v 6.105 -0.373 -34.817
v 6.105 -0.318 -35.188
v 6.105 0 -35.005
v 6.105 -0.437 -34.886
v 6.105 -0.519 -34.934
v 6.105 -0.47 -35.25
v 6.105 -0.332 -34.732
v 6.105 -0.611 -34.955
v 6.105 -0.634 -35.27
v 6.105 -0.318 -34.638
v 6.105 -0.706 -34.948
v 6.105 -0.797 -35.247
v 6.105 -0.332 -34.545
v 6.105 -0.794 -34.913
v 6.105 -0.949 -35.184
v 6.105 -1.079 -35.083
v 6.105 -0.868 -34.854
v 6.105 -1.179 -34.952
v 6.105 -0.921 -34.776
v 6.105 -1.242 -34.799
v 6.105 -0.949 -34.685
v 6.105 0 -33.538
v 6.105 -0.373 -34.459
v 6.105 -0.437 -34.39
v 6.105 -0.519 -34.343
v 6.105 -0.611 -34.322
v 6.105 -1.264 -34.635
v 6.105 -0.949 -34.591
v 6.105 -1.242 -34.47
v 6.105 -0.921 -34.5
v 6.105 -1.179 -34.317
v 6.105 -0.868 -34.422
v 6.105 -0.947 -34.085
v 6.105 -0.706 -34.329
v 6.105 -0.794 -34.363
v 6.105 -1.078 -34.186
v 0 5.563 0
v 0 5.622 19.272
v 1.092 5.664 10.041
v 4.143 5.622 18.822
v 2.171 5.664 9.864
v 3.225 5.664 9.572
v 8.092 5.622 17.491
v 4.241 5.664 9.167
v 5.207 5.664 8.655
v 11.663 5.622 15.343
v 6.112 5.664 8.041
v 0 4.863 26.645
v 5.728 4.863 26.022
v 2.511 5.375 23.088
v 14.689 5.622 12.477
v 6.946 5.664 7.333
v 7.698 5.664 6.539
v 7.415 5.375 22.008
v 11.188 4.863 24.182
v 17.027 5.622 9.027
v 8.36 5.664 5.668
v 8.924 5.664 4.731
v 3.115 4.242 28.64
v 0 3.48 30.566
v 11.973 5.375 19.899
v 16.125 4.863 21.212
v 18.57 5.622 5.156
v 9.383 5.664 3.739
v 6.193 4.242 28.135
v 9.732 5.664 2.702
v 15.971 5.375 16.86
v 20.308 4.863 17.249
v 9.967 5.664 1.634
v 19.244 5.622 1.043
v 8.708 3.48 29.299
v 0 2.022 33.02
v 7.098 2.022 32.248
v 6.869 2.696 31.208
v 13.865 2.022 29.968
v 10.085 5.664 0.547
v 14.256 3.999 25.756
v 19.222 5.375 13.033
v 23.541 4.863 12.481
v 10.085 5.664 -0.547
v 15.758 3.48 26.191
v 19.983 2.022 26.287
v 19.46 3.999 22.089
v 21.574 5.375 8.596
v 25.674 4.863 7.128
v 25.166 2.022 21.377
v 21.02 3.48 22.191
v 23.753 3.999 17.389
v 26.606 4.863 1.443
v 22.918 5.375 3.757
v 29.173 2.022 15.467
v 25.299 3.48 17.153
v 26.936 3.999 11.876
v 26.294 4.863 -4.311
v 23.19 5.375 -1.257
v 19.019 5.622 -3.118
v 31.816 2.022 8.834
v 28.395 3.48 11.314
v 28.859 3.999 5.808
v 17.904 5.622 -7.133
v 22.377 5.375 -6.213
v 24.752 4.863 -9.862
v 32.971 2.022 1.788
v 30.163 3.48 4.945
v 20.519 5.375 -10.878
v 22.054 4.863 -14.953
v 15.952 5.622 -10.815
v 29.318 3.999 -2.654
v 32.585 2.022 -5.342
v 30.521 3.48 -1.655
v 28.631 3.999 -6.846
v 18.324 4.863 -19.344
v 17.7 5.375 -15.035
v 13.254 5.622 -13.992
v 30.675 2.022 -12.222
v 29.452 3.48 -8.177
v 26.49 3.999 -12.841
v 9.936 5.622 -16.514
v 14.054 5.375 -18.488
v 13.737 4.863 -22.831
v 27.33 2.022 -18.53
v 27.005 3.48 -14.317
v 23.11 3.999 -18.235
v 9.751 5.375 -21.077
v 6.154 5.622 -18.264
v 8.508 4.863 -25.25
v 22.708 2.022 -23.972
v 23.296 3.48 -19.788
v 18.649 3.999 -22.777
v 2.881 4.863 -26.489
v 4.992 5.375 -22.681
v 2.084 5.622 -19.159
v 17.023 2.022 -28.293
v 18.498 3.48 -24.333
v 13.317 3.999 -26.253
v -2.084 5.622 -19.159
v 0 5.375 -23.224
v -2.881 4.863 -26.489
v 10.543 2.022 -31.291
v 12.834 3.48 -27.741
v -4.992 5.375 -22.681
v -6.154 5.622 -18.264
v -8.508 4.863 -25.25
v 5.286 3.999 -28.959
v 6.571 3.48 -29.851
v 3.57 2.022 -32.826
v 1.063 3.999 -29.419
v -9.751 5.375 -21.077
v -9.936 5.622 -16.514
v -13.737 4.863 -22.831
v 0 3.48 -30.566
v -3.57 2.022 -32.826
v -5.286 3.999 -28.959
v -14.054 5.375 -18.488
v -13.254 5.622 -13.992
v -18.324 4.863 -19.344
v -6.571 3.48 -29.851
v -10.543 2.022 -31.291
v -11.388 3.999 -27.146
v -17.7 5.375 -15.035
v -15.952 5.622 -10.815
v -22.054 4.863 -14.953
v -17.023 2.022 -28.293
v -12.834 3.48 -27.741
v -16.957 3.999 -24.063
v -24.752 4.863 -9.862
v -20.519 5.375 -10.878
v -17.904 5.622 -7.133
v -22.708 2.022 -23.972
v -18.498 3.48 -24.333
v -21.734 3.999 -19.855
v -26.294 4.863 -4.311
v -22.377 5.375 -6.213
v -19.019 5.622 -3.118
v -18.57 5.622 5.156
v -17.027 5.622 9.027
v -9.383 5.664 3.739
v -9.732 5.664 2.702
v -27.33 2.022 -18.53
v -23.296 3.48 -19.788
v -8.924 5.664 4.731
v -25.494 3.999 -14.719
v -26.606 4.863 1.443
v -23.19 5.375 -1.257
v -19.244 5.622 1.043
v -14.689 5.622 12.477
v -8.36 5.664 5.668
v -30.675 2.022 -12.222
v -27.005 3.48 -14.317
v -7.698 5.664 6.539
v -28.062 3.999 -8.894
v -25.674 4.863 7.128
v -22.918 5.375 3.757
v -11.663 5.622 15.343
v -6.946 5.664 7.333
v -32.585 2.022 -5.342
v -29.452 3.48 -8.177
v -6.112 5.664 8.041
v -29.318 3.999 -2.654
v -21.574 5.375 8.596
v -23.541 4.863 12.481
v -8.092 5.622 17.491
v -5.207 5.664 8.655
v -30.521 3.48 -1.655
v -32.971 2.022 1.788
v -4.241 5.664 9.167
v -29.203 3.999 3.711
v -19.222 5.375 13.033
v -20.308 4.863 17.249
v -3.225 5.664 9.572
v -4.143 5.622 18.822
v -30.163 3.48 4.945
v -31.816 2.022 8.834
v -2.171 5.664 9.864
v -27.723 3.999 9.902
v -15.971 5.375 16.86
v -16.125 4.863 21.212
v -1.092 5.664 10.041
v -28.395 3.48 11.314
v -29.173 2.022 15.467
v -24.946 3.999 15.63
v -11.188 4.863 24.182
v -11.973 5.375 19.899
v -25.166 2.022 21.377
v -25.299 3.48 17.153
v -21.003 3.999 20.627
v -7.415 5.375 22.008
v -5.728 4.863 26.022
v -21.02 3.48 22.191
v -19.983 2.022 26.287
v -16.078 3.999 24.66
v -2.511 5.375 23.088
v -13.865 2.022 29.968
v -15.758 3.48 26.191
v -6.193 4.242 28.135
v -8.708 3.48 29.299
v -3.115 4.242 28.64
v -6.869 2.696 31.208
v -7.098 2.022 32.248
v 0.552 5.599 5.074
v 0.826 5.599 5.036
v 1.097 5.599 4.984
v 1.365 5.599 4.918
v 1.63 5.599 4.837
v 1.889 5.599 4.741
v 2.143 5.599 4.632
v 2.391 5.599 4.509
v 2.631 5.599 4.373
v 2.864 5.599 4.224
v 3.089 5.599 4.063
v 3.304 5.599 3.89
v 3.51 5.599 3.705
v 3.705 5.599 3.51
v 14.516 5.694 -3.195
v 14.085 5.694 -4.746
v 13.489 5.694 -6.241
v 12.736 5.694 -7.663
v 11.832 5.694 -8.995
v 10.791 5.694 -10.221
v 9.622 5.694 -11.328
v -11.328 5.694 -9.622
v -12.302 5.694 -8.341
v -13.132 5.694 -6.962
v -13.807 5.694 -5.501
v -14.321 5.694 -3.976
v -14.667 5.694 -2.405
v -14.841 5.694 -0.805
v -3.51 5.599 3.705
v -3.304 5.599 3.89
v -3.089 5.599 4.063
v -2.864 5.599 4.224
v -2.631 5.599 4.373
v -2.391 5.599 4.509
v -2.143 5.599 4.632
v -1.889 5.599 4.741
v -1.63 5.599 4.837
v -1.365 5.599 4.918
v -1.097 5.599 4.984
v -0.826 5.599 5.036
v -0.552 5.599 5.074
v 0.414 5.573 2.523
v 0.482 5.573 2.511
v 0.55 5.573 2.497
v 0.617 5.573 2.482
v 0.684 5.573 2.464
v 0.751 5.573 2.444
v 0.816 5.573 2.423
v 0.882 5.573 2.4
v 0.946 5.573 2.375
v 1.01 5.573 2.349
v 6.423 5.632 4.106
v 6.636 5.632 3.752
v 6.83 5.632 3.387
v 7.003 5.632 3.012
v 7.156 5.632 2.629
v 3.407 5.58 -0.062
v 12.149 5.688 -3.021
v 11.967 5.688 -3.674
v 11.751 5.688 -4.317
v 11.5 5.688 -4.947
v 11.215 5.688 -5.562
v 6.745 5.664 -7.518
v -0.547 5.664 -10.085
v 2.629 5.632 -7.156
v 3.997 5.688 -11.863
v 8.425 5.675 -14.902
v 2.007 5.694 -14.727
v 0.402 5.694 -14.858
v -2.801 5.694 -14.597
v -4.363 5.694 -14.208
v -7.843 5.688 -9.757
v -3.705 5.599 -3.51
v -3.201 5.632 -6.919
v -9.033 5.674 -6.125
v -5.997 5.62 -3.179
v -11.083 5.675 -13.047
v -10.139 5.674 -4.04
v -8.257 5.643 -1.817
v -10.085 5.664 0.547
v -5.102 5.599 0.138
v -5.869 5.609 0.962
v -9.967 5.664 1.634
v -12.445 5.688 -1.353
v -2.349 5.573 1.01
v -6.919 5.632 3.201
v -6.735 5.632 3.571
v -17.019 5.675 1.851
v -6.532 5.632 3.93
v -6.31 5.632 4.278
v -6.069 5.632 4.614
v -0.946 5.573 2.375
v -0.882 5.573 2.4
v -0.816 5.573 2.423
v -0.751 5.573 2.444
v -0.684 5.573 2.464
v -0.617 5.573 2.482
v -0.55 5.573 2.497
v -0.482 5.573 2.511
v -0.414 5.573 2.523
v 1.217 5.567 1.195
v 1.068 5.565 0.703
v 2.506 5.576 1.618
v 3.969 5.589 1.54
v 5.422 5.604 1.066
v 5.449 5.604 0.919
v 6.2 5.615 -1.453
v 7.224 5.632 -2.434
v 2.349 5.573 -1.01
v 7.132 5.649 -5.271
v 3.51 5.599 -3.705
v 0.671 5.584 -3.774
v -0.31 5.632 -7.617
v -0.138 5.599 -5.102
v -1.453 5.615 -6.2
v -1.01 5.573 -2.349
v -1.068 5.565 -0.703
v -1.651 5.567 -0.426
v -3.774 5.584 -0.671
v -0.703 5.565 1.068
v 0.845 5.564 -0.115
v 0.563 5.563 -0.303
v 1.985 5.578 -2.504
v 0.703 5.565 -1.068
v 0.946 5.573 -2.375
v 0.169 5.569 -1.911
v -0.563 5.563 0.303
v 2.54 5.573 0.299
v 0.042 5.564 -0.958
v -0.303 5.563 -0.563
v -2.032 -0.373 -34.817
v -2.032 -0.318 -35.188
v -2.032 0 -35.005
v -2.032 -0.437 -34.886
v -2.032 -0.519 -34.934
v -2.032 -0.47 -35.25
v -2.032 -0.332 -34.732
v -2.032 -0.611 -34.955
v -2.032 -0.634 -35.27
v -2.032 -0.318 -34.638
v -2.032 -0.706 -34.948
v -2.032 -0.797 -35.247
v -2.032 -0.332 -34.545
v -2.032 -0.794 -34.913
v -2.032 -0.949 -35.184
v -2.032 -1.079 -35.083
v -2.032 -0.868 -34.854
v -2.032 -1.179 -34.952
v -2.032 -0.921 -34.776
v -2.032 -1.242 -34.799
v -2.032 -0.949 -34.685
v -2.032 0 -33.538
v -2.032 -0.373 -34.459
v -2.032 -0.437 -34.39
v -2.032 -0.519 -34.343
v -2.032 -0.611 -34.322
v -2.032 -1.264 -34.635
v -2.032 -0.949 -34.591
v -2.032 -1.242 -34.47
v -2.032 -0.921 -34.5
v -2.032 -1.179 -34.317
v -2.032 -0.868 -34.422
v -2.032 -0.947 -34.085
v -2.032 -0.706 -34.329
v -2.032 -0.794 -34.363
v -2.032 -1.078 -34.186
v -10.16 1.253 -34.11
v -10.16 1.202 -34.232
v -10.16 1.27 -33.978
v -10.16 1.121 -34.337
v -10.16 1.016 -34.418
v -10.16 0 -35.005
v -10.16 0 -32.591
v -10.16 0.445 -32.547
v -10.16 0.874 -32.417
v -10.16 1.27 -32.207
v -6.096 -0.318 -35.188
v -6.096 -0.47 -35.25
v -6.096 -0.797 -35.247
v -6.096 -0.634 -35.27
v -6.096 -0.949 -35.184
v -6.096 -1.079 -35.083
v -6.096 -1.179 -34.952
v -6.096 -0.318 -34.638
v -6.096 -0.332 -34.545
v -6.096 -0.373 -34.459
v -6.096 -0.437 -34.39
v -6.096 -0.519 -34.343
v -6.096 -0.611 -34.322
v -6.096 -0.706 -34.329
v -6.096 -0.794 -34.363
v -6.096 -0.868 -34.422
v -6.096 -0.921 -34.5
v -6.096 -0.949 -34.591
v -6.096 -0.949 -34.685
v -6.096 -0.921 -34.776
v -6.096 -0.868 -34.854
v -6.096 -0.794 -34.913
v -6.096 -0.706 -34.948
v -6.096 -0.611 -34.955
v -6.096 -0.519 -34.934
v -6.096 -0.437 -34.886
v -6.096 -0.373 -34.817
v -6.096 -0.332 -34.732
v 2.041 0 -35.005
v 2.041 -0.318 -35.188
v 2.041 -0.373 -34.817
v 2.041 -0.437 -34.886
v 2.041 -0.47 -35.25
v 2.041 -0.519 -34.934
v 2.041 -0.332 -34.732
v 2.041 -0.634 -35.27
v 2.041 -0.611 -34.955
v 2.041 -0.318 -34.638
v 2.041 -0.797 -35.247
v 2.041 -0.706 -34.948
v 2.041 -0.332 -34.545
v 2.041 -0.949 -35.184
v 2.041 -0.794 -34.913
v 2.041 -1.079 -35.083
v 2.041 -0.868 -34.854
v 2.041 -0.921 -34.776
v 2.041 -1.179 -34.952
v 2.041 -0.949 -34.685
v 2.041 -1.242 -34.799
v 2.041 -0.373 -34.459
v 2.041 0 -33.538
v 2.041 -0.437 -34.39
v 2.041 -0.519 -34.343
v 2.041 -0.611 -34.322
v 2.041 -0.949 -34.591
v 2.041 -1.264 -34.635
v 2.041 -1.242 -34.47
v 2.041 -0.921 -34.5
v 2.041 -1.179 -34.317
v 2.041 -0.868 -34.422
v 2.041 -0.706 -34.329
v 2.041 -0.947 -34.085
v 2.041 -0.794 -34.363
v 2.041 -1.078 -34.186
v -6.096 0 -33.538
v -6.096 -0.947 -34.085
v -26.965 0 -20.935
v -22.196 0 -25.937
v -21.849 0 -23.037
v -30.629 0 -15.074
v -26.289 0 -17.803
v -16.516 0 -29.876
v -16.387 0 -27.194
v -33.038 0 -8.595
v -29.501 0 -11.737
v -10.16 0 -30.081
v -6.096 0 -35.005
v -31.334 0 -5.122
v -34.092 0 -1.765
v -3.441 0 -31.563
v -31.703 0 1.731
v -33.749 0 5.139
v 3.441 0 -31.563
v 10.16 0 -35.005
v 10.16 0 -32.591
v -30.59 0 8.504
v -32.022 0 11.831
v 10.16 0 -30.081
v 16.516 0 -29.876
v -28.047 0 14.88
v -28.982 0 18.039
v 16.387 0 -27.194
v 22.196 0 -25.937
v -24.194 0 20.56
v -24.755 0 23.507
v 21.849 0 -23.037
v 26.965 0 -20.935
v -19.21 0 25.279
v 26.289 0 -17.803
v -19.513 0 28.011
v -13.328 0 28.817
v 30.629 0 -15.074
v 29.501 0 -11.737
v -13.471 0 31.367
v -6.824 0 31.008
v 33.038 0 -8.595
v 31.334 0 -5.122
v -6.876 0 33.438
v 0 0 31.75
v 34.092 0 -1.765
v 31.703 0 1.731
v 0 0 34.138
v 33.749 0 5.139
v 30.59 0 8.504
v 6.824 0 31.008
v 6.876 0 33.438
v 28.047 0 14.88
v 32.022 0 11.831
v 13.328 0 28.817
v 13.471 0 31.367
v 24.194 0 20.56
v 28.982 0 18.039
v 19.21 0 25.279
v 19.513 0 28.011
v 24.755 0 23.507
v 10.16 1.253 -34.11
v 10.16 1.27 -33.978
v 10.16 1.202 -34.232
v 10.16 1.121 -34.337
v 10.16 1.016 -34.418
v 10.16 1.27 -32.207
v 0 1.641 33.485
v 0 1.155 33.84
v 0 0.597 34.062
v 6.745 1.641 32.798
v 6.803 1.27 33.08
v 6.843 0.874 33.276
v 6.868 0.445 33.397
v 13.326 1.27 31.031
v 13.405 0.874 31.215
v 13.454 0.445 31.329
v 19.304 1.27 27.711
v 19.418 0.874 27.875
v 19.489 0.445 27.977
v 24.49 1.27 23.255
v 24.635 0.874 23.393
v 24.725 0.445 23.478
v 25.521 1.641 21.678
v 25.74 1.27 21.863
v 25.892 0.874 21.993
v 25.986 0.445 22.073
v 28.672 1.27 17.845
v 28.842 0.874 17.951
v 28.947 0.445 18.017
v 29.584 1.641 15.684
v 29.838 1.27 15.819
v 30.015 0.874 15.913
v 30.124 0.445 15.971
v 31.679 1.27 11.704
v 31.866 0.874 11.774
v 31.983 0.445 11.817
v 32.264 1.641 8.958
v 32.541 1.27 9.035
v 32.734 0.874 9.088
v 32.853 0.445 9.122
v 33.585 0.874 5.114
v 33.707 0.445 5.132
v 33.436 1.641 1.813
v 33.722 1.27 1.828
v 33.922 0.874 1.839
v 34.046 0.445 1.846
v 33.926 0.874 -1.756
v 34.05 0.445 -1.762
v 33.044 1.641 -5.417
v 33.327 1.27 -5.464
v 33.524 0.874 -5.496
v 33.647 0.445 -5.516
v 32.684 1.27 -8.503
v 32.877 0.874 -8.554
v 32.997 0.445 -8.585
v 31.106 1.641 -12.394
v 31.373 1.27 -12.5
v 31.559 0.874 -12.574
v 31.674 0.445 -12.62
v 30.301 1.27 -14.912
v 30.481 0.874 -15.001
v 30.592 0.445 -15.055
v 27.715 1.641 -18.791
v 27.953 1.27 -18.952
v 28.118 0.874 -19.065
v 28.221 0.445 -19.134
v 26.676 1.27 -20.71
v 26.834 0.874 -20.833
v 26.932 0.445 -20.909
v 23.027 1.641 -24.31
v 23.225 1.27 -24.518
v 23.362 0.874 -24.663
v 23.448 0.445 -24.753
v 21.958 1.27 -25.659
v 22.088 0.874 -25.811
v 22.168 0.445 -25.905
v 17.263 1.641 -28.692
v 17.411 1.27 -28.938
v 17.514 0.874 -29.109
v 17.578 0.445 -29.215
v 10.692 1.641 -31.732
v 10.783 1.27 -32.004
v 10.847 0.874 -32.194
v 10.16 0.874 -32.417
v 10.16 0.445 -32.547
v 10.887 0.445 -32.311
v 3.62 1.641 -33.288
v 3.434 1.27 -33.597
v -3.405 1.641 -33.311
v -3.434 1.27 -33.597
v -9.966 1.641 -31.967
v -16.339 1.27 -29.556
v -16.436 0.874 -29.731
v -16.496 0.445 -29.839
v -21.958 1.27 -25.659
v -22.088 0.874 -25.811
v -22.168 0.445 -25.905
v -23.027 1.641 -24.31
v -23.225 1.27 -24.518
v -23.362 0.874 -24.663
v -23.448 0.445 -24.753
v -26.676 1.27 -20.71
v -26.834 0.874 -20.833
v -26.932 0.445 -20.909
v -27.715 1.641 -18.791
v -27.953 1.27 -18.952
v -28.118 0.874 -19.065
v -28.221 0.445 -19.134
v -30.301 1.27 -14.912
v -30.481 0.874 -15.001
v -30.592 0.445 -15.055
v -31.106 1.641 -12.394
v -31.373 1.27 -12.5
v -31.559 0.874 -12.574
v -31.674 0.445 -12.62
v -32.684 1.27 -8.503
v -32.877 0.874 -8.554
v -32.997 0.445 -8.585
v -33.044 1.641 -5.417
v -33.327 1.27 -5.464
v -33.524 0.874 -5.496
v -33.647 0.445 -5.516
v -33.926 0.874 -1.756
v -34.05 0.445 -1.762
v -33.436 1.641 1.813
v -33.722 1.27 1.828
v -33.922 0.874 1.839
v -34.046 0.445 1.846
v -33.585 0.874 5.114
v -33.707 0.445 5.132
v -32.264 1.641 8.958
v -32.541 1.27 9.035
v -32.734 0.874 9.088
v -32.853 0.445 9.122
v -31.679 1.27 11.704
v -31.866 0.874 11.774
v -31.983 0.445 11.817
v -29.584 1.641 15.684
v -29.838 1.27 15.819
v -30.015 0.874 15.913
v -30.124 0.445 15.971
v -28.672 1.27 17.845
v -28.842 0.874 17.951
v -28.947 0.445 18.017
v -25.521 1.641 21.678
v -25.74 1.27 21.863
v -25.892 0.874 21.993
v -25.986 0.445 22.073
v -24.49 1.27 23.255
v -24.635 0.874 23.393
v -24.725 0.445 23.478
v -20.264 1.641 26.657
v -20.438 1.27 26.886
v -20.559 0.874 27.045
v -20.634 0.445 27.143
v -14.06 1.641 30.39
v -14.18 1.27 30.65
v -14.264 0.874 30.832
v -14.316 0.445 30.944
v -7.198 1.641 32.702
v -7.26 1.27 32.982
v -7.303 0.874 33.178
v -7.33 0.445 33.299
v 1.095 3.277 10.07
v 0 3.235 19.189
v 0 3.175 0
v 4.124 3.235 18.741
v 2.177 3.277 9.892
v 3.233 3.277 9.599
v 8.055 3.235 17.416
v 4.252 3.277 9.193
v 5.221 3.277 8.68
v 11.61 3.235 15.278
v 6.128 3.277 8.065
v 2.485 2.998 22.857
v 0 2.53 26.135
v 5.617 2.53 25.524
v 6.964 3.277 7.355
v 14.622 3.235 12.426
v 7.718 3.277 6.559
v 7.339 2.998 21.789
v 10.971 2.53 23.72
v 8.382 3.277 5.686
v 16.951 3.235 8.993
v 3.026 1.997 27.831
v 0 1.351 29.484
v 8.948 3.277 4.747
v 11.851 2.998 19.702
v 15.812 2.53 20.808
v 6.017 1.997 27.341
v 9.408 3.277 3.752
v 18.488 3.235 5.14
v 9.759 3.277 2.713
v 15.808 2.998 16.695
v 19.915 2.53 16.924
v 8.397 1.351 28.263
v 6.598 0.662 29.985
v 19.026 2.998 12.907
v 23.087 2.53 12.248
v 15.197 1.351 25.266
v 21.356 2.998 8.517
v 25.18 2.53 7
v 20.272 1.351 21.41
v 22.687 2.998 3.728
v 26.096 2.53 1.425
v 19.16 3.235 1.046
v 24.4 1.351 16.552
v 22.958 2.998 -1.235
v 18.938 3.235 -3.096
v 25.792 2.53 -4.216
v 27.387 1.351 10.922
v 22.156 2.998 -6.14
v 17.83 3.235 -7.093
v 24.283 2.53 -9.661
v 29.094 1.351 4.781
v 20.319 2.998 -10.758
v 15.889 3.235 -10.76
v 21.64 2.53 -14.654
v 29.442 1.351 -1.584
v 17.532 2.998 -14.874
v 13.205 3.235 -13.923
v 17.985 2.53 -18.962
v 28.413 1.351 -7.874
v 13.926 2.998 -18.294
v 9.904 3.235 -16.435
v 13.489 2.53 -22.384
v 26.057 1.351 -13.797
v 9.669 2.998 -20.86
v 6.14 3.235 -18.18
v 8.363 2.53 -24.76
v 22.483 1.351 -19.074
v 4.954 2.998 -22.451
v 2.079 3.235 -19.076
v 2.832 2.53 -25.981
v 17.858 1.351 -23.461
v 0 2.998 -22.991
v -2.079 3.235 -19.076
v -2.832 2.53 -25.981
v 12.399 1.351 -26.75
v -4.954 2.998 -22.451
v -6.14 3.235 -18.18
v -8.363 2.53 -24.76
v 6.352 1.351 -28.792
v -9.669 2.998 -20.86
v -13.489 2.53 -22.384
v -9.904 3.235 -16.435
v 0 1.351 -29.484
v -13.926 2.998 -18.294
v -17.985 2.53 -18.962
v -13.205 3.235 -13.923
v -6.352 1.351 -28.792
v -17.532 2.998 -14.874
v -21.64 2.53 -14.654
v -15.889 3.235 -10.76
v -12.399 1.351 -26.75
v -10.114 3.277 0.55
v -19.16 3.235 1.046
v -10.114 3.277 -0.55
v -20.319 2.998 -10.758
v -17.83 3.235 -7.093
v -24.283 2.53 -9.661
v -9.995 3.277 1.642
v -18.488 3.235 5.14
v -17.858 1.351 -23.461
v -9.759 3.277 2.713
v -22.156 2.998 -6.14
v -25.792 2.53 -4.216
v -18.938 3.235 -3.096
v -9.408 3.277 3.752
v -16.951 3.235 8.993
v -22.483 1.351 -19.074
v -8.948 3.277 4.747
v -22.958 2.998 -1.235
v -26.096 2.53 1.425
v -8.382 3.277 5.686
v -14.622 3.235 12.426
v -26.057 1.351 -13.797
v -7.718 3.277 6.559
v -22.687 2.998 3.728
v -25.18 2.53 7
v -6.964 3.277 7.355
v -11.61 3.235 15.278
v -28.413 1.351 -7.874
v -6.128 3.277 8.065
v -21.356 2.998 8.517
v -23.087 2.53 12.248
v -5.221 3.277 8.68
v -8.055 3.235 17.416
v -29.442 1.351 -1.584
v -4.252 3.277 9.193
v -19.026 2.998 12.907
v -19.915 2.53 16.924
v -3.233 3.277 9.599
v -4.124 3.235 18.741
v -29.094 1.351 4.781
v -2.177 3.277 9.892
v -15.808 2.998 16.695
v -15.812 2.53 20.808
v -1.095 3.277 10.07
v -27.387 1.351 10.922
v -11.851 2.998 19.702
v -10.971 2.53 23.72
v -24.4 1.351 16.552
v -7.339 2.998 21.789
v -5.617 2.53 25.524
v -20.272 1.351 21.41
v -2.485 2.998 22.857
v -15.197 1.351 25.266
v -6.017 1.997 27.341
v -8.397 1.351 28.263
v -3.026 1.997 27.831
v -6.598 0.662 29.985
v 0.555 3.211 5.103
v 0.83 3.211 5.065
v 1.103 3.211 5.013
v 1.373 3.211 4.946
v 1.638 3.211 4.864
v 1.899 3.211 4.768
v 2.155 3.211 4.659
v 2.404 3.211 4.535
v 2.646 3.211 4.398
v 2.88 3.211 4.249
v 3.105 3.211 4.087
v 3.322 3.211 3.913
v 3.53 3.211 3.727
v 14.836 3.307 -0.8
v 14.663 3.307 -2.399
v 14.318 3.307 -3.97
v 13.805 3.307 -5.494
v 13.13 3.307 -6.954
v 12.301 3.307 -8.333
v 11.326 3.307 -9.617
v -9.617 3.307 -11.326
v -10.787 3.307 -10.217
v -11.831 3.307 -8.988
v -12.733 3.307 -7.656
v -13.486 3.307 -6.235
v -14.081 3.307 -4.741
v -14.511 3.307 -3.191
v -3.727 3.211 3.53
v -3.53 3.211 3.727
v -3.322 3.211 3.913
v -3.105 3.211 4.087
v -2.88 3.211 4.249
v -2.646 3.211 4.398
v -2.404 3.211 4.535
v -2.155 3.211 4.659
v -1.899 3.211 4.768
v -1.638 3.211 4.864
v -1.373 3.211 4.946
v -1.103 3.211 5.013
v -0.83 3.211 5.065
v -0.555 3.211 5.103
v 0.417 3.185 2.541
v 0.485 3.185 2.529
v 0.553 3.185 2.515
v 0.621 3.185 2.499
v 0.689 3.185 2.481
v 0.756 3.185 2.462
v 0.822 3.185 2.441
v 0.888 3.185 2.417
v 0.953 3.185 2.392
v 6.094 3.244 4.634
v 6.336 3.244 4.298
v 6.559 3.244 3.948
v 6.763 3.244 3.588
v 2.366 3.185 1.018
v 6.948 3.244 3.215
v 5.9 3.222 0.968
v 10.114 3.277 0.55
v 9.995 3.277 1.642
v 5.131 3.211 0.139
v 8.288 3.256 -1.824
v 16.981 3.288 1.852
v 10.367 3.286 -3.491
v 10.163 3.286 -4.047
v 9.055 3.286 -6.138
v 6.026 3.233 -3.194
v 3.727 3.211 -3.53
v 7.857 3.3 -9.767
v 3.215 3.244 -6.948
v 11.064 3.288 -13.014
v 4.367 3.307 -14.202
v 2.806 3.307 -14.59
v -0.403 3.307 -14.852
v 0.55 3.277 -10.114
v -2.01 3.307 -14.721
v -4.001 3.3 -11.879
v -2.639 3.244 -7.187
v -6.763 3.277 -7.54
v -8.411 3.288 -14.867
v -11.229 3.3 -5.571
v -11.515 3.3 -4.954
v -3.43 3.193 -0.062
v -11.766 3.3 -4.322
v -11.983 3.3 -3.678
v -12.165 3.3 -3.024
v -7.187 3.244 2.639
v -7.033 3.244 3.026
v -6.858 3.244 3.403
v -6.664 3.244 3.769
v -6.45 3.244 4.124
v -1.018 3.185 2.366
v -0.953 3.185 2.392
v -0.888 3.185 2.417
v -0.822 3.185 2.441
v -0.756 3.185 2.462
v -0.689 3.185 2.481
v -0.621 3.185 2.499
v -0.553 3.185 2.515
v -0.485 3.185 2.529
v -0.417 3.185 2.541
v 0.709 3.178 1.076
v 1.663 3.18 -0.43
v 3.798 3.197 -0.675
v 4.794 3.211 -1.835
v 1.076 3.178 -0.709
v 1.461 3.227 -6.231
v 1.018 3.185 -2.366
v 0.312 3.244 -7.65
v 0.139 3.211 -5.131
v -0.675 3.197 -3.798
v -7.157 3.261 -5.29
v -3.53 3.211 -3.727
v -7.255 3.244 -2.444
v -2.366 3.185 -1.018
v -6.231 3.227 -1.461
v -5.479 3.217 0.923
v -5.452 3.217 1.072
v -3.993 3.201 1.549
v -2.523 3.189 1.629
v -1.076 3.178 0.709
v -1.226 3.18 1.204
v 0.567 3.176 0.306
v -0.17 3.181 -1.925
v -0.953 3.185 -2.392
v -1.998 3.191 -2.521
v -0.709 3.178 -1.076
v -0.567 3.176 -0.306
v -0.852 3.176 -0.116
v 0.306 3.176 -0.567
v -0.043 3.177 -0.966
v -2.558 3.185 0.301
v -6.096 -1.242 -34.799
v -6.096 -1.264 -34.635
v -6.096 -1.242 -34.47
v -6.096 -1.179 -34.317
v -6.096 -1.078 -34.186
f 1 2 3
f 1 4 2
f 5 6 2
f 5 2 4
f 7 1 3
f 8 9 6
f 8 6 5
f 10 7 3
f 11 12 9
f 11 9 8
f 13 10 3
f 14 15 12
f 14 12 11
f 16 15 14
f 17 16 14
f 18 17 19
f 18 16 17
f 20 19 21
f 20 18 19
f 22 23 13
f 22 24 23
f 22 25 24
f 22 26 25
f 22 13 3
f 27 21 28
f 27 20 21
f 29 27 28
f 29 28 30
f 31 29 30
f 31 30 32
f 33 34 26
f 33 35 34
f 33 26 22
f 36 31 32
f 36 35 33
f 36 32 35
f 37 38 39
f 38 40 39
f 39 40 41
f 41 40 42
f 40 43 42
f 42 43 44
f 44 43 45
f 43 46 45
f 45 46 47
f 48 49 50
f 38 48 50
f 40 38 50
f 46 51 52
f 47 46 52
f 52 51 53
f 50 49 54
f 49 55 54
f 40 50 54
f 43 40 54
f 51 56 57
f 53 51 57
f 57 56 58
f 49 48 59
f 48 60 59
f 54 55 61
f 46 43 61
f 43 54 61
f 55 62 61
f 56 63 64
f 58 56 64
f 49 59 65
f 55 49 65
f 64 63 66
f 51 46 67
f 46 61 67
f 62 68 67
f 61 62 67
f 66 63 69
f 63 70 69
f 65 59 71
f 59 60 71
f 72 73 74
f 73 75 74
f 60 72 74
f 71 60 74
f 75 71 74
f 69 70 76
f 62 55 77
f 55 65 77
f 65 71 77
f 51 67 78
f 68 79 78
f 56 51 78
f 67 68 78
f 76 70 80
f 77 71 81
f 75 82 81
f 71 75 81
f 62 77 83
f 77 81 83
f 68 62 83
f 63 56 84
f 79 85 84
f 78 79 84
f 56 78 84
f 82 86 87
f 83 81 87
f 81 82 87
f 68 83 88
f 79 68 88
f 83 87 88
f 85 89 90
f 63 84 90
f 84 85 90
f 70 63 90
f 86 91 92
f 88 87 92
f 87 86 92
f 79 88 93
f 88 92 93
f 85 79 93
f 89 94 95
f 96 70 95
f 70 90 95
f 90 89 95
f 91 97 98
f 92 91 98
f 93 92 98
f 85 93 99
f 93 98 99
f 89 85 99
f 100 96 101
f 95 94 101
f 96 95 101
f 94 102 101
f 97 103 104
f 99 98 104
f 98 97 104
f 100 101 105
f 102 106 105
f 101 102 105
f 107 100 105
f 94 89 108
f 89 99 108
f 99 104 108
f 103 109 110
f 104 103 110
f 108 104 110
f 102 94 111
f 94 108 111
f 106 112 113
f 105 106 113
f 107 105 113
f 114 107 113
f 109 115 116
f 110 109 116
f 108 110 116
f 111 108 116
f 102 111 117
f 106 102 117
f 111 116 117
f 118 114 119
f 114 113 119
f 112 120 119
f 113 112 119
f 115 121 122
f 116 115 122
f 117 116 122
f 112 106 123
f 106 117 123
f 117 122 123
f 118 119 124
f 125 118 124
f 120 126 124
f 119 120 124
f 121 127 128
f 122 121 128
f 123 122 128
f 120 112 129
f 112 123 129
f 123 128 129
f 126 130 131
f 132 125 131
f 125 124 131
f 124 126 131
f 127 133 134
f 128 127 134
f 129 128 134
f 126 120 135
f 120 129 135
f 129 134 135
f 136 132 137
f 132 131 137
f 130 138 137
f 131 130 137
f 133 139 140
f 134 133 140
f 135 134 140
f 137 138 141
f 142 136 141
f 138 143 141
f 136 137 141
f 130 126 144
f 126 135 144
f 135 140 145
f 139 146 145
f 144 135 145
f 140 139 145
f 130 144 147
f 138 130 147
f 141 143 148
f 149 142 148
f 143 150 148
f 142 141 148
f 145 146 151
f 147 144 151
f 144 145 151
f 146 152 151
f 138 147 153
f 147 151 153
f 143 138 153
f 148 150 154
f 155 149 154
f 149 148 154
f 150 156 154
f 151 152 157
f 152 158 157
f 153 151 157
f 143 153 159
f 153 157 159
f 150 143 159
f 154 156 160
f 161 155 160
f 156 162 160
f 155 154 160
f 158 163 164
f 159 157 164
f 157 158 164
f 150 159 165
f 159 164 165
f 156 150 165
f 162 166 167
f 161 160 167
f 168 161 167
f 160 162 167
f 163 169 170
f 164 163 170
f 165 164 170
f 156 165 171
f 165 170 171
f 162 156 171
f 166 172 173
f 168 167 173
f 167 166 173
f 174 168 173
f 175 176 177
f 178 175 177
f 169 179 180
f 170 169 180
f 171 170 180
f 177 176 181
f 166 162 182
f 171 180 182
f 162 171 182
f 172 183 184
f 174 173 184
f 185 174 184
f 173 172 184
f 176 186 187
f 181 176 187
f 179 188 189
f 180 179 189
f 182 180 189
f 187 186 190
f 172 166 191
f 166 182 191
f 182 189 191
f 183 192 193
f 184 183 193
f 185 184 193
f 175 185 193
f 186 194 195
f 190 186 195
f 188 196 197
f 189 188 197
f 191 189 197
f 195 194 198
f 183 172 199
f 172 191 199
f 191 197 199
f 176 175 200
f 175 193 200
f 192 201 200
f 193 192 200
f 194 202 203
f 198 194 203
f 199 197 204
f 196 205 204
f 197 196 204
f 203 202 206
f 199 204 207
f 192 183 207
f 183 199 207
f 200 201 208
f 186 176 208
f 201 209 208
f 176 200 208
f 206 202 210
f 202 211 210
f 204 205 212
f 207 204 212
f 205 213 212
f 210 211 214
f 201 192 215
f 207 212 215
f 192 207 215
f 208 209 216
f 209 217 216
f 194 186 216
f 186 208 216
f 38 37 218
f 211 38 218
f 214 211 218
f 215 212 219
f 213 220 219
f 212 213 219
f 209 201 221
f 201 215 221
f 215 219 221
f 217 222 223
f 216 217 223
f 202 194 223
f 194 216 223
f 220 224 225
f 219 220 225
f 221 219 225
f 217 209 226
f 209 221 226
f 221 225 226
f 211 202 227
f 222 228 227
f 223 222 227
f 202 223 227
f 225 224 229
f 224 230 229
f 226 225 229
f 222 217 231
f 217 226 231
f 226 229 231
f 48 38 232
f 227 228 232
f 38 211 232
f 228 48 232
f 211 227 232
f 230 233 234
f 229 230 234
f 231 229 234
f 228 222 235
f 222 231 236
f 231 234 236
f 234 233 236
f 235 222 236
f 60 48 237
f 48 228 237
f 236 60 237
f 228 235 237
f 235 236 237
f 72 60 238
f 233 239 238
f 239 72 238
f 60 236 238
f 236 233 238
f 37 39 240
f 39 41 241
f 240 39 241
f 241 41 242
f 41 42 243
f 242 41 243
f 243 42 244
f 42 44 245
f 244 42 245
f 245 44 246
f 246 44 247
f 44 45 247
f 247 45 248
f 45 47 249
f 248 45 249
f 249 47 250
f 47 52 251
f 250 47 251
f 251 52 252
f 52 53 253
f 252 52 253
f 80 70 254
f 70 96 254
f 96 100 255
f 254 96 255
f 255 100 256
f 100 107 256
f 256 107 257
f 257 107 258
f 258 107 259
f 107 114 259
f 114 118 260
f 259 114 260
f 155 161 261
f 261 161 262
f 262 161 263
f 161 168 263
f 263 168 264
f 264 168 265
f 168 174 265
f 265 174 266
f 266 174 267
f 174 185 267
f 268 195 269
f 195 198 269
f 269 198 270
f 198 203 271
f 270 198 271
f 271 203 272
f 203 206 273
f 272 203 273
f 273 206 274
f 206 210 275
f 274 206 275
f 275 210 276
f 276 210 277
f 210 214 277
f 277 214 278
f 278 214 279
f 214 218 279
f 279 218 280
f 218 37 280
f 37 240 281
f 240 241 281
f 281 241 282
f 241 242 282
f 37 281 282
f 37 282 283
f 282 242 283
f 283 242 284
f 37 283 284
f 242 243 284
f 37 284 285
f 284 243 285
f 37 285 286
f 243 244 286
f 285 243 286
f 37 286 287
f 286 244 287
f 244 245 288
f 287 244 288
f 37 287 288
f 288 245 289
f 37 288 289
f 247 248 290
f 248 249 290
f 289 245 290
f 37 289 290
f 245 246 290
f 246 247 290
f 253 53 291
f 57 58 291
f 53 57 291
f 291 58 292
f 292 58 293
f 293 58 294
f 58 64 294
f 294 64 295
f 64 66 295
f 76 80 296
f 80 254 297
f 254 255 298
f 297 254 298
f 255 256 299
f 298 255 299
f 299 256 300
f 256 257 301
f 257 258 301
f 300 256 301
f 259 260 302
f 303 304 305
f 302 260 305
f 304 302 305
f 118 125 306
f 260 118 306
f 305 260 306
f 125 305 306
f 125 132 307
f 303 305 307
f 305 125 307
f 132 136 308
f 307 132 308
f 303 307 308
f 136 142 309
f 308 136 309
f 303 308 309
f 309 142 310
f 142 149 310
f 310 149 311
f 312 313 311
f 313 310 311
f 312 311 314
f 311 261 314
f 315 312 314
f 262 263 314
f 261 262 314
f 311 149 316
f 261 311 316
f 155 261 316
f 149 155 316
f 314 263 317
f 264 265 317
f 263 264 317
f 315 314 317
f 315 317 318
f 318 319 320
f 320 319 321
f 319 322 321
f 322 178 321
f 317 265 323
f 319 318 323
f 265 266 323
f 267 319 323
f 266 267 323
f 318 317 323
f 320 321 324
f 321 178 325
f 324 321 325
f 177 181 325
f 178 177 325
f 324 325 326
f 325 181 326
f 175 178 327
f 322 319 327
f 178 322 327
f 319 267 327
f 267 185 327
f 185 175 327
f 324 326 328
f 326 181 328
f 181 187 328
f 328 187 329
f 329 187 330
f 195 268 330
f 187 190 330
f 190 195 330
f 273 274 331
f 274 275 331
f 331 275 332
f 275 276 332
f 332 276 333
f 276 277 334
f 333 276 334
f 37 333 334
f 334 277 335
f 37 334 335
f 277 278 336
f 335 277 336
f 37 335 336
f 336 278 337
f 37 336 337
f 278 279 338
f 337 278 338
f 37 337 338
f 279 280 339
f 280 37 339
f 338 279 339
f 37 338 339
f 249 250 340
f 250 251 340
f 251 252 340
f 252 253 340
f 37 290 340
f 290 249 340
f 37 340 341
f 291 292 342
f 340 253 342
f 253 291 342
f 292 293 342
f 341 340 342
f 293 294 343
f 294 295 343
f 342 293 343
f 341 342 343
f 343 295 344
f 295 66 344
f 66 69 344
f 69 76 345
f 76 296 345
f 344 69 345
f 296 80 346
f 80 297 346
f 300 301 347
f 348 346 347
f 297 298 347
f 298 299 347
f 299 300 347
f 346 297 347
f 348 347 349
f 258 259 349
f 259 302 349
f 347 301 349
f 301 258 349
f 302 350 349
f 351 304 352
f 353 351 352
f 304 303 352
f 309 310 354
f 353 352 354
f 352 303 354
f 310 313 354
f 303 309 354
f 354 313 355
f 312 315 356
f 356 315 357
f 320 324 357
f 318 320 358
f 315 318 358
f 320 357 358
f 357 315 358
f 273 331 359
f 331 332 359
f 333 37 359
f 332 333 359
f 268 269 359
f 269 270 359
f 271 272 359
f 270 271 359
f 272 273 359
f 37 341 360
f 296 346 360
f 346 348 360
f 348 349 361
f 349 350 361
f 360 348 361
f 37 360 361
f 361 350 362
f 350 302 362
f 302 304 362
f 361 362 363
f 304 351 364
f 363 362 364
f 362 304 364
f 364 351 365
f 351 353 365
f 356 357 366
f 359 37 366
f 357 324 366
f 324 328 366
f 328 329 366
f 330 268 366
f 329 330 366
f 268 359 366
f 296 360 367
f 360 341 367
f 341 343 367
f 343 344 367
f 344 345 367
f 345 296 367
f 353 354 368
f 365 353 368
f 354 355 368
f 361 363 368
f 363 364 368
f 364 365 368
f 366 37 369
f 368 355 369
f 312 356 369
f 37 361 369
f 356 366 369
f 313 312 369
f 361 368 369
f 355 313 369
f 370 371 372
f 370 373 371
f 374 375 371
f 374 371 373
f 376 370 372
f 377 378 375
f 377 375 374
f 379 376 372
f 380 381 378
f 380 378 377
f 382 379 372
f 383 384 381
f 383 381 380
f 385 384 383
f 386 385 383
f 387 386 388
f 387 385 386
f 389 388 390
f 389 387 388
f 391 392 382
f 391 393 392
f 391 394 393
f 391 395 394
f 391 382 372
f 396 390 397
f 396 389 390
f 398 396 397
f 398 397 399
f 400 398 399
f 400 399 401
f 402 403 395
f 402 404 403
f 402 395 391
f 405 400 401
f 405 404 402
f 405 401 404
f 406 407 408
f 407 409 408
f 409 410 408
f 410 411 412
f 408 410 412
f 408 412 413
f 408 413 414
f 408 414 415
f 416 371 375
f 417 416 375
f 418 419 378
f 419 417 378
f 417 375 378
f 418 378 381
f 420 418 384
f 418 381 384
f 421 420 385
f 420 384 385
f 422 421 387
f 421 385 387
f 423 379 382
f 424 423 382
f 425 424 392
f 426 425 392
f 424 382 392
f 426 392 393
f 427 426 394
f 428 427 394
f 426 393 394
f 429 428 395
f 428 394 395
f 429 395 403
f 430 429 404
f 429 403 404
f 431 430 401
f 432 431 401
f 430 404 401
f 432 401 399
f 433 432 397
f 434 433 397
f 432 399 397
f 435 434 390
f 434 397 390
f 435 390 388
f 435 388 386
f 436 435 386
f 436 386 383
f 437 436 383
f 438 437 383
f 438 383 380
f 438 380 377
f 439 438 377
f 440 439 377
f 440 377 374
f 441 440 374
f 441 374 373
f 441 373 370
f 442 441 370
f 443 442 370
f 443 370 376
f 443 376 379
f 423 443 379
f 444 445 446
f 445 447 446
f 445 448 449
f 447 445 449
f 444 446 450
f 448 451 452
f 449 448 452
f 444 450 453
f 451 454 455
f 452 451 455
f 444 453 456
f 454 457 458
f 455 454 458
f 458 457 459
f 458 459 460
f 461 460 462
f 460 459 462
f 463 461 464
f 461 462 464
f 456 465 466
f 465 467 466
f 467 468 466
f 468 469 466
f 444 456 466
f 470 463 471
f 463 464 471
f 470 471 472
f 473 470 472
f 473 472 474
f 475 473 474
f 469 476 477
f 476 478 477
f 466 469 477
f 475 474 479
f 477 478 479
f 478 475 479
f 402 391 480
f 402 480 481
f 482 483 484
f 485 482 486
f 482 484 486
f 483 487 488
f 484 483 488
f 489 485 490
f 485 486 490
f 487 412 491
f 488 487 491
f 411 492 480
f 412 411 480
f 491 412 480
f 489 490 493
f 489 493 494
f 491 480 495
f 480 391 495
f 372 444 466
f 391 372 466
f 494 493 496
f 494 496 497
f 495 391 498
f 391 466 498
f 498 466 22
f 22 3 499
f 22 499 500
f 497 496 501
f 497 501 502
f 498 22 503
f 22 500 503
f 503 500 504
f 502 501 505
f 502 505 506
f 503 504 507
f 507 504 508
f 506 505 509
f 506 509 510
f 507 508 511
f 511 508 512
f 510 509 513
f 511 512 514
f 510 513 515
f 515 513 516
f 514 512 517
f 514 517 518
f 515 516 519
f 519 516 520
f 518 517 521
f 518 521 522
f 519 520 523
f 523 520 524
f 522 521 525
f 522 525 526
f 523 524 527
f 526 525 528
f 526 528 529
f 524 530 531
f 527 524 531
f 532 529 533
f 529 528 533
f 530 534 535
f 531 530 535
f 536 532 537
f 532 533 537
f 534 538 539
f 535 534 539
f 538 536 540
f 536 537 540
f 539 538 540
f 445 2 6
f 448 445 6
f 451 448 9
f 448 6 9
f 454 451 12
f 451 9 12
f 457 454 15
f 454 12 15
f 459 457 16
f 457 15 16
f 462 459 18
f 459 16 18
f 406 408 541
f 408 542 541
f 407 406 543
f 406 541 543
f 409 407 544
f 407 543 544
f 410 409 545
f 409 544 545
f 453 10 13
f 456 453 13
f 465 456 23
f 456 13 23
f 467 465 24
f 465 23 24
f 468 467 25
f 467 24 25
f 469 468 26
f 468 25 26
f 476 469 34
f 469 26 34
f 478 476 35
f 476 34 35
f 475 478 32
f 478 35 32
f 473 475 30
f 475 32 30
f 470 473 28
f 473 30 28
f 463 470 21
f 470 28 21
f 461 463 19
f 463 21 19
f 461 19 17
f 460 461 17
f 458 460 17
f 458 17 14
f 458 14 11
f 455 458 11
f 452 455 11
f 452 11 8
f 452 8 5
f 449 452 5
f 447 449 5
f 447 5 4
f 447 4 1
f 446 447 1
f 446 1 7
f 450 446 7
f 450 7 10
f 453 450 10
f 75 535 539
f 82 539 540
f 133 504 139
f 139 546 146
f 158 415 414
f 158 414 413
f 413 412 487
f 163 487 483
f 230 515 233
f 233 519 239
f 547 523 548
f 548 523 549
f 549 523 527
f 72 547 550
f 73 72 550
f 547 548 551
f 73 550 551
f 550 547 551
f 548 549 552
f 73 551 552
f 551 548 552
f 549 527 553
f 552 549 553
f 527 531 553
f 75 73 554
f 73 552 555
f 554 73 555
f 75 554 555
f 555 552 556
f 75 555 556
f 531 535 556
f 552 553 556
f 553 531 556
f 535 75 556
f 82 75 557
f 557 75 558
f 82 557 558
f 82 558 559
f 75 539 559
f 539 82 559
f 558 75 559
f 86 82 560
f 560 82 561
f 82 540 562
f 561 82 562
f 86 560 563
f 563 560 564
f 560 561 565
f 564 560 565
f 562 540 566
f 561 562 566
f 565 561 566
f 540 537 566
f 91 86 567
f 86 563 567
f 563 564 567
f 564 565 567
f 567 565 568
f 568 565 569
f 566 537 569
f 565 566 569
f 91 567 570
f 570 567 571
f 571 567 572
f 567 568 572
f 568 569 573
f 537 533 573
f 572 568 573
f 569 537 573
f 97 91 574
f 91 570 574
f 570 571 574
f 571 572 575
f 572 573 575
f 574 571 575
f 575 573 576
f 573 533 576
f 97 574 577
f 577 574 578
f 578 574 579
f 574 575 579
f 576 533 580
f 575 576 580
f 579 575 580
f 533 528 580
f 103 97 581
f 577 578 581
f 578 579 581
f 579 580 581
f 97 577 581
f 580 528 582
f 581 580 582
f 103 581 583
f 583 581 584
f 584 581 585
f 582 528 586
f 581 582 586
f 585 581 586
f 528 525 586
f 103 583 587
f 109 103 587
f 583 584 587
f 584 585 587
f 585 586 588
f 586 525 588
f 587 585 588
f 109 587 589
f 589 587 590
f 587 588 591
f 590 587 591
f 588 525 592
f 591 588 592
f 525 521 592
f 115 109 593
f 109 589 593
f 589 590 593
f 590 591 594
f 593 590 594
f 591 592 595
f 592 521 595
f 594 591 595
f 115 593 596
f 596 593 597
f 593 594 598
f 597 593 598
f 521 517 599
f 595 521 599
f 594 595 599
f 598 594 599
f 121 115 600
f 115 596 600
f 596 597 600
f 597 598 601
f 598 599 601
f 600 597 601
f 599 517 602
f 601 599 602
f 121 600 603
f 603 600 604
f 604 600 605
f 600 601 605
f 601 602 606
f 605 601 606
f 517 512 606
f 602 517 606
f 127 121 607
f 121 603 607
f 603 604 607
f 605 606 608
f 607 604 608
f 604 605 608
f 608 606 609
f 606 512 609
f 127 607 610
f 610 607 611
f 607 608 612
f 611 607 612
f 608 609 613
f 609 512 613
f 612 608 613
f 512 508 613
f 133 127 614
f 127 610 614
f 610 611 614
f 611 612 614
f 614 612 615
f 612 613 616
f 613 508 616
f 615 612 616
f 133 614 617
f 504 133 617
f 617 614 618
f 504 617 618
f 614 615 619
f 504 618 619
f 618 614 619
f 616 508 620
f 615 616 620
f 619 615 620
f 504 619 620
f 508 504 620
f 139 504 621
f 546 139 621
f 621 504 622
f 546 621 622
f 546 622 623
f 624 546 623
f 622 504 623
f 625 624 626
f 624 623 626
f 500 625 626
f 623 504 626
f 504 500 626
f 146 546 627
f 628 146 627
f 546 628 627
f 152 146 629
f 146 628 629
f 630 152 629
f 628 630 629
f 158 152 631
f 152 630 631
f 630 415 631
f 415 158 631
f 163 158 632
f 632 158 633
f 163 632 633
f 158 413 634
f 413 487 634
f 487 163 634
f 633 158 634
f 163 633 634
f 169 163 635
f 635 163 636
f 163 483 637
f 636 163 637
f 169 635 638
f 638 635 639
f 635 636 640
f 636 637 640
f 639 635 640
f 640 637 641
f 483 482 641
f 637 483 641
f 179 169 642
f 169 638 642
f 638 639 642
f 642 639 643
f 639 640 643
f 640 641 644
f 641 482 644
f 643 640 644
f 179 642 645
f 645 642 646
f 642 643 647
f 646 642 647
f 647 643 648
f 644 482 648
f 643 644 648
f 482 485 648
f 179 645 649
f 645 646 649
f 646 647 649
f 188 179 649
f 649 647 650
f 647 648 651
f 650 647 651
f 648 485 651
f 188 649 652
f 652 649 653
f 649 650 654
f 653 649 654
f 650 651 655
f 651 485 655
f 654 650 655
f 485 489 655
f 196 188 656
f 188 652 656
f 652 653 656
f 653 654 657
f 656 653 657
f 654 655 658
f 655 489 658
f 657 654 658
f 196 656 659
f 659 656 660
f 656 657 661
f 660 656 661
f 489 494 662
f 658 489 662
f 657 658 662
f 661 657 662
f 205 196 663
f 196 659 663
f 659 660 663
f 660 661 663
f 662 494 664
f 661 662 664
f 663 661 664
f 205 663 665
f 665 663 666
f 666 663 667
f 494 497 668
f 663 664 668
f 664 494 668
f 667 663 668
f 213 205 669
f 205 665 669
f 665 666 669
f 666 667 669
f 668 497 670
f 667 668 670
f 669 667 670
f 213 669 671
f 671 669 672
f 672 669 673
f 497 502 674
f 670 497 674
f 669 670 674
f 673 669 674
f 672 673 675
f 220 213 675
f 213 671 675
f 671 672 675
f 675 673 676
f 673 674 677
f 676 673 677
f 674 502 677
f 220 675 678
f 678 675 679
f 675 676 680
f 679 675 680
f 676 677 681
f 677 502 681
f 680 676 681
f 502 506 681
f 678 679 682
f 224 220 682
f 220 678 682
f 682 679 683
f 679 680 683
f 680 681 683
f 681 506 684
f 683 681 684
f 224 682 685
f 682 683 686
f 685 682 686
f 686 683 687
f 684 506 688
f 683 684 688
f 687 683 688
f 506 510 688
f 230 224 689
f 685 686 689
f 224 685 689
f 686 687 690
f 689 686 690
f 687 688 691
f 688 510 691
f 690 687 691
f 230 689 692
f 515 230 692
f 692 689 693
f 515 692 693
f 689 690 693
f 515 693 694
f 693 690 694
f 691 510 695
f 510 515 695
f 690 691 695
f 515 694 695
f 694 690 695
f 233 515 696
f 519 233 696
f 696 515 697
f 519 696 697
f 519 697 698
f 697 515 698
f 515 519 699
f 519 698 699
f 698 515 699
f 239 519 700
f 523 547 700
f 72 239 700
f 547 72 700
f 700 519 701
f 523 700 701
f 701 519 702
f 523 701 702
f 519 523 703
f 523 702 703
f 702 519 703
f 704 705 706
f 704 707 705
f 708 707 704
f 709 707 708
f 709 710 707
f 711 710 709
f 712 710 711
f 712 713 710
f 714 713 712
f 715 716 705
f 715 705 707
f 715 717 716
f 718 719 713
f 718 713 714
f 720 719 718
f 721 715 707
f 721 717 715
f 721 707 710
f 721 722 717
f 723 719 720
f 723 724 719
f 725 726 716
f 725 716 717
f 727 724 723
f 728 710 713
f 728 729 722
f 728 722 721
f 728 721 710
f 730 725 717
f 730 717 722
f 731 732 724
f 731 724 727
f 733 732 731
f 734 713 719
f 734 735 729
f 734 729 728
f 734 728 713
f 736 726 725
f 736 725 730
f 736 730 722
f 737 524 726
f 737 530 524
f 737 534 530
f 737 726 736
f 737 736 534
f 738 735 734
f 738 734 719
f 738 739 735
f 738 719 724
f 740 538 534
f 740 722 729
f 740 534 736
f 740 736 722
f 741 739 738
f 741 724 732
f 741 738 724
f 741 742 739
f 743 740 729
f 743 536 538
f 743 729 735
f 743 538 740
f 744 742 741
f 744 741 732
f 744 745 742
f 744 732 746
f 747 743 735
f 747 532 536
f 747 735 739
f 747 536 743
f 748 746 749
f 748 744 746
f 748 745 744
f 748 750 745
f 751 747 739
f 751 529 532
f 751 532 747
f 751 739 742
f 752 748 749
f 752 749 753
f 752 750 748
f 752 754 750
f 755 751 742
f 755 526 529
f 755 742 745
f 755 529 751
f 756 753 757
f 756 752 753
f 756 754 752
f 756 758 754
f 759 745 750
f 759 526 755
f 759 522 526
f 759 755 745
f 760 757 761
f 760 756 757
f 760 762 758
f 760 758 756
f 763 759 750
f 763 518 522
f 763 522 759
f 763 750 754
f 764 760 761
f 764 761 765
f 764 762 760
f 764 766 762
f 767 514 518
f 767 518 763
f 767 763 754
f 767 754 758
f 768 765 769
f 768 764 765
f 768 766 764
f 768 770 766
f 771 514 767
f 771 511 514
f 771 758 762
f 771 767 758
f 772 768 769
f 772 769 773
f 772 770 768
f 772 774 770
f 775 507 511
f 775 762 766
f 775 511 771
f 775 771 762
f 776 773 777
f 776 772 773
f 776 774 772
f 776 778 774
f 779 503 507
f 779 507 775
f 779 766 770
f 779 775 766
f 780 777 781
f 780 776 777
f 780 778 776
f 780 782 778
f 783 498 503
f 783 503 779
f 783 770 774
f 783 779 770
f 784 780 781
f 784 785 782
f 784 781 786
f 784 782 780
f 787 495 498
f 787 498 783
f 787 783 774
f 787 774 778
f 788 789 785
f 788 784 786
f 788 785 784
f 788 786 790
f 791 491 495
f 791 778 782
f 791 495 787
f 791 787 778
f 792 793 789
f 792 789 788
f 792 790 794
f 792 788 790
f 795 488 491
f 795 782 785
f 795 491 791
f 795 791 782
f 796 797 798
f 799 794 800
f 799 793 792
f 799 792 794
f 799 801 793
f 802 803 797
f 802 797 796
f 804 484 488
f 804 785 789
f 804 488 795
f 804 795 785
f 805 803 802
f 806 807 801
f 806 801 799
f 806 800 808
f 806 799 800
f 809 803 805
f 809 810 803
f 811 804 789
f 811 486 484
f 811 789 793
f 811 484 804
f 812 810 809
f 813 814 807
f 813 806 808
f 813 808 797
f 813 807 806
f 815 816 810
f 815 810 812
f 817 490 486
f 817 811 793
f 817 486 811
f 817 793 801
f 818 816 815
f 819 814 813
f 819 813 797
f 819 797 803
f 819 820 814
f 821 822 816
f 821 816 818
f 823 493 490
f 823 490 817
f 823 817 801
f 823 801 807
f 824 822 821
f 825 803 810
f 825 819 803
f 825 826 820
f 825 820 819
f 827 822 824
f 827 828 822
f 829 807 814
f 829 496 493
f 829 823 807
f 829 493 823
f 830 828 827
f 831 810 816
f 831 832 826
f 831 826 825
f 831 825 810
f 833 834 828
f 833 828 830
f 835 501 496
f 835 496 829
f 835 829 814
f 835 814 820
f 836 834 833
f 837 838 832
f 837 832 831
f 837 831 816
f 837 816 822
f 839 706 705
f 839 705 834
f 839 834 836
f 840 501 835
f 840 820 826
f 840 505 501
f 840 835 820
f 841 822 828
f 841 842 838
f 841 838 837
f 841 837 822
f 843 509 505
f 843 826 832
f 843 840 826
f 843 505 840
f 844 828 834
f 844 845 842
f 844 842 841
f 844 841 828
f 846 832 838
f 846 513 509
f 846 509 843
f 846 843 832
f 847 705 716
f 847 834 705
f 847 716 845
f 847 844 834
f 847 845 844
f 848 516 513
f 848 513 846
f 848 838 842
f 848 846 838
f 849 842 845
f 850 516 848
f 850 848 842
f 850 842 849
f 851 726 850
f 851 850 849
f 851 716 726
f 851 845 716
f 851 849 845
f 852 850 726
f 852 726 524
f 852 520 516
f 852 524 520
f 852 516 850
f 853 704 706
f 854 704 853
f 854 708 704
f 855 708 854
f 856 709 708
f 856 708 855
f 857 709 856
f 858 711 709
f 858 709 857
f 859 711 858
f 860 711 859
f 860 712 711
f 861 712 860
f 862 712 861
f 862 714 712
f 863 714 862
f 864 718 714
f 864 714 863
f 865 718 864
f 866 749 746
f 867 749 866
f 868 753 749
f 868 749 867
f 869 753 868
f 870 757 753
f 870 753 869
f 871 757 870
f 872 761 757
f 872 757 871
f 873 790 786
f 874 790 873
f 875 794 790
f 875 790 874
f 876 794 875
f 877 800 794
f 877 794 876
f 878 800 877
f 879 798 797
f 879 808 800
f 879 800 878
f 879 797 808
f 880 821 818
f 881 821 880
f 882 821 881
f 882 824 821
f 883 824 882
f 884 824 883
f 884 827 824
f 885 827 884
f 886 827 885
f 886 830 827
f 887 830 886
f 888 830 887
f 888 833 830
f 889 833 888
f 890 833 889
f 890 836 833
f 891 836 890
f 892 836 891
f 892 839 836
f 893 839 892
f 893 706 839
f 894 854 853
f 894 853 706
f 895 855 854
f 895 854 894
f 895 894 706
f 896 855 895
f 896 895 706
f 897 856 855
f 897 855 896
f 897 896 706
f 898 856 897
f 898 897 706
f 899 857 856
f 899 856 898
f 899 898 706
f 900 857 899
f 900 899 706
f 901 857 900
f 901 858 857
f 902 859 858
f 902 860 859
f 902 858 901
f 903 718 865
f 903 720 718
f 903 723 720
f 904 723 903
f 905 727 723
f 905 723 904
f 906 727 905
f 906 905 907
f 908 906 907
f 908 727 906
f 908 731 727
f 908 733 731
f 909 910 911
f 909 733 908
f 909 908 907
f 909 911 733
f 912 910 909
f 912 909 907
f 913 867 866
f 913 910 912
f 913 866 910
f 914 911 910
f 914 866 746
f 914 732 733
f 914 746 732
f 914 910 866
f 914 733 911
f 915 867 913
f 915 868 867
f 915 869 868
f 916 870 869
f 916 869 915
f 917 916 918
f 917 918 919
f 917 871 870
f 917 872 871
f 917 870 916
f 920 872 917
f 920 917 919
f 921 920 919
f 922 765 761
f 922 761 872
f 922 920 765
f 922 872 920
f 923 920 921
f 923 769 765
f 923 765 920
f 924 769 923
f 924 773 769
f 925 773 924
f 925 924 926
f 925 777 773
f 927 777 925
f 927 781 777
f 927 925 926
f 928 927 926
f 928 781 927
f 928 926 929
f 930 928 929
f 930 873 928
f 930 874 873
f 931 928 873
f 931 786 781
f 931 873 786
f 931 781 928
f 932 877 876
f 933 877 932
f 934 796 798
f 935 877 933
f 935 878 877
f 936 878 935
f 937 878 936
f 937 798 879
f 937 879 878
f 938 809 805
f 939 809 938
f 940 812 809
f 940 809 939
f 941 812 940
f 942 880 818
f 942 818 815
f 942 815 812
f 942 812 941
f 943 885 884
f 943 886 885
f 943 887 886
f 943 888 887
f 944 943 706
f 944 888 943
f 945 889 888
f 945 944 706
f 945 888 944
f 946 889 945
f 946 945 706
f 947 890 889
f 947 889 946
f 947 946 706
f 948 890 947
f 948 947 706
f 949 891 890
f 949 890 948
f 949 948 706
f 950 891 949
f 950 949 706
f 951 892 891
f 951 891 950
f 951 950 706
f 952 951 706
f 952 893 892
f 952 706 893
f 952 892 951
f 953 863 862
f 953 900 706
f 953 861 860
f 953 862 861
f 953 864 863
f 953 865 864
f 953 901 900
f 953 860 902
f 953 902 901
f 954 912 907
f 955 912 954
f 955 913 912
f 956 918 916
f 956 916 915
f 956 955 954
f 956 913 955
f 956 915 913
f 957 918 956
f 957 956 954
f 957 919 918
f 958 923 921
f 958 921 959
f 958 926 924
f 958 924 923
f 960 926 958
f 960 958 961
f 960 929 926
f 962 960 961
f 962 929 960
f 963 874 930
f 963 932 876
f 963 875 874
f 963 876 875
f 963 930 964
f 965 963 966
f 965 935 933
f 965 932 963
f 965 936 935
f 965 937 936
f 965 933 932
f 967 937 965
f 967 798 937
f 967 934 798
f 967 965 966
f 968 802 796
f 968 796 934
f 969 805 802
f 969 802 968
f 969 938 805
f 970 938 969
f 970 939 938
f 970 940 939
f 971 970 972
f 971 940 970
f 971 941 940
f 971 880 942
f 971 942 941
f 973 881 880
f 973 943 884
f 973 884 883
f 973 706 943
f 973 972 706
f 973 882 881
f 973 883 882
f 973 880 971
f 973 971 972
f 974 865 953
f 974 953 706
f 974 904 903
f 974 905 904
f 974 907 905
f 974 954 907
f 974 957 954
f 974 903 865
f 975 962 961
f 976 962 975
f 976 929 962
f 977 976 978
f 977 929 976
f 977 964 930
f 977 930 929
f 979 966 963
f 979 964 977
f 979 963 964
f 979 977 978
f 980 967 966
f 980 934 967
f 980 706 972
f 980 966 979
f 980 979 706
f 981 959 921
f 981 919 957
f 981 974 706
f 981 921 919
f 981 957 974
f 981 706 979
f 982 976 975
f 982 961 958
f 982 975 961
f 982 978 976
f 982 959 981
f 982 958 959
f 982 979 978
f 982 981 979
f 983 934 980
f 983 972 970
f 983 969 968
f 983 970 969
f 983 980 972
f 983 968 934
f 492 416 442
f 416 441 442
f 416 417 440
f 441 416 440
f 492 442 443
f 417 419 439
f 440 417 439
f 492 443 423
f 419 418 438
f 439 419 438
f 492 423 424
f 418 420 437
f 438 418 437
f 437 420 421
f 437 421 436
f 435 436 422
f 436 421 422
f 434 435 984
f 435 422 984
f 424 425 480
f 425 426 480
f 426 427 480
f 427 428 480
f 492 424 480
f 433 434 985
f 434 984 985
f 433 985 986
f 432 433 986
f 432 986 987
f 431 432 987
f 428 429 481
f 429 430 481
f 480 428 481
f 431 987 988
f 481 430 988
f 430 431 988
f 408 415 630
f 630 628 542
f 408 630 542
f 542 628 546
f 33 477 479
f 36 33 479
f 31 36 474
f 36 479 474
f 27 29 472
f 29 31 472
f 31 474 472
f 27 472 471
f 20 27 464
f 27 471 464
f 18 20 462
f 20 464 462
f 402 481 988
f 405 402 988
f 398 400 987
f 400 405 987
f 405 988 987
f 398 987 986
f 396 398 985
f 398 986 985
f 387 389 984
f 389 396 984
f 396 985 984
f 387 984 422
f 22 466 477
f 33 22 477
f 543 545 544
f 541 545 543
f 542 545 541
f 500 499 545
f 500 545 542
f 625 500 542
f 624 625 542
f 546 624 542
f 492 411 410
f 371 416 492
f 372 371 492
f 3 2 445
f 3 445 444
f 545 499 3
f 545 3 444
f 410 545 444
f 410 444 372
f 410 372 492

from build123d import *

# Parameters (mm, degrees)
F3_DEPTH  = 1.27
F5_DEPTH  = 20.32
F6_R      = 0.3175
F7_DEPTH  = 44.2986001
F8_R      = 0.63499
F10_W     = 4.064
F10_H     = 4.1974456223
F10_W_2   = 4.0730612593
F10_H_2   = 4.2563648137
F10_W_3   = 4.0549387407
F10_H_3   = 4.7988080594
F11_DEPTH = 1.27
F12_R     = 0.508


# Not quite as in the source:
# - a fillet or chamfer is up to 0.001 mm smaller than in the source, because OpenCascade refuses the exact size
# - the dataset's text gives a spline's control points without its knots; the knots are read off the source's solid


with BuildPart() as f1:
    # F0 (on Right) → F1 (revolve)
    with BuildSketch(Plane.YZ):
        with BuildLine():
            add(Edge.make_bspline(
                [(3.175, 0), (3.175, 10.541), (4.0422536131, 25.9599614942), (0.796980629, 30.4808964435), (0, 31.75)],
                knots=[0, 0, 0, 0, 0.6812910354, 1, 1, 1, 1], degree=3))
            Line((3.175, 0), (5.5626, 0))
            add(Edge.make_bspline(
                [(5.5626, 0), (5.5626, 1.9176420969), (5.6020893532, 5.762973782), (5.6885968485, 11.3738399623), (5.7094253413, 16.6481644408), (5.5926732239, 20.6231912945), (5.3654131178, 23.4820630282), (5.1533733603, 25.1266929623), (4.9307019402, 26.3534786039), (4.7314848723, 27.2341461126), (4.5009658464, 28.0565495549), (4.1603640769, 29.0720787187), (3.6833271227, 30.1983946783), (2.8754214133, 31.7152927686), (2.3102553011, 32.5606898933), (2.0219615984, 33.0197657478)],
                knots=[0, 0, 0, 0, 0.125, 0.25, 0.375, 0.5, 0.5625, 0.625, 0.65625, 0.6875, 0.71875, 0.75, 0.8125, 0.875, 0.9999999969, 0.9999999969, 0.9999999969, 0.9999999969], degree=3))
            ThreePointArc((2.0219615984, 33.0197657478), (1.1551928541, 33.8395366065), (0, 34.1376))
            Line((0, 34.1376), (0, 31.75))
        make_face()
    revolve(axis=Axis((0, 2.7813, 0), (0, 1, 0)))

    # F2 (on face) → F3 (join)
    with BuildSketch(Plane.XZ):
        with BuildLine():
            ThreePointArc((10.16, -30.0805069771), (0, -31.75), (-10.16, -30.0805069771))
            Line((-10.16, -30.0805069771), (-10.16, -34.2715069771))
            Line((-10.16, -34.2715069771), (10.16, -34.2715069771))
            Line((10.16, -34.2715069771), (10.16, -30.0805069771))
        make_face()
    extrude(amount=-F3_DEPTH)

    # F4 (on face) → F5 (join)
    with BuildSketch(Plane.YZ.offset(10.16)):
        Polygon((-0.8615136853, -35.5021369771), (1.27, -34.2715069771), (0.635, -33.1716547143), (-1.4965136853, -34.4022847143), align=None)
    extrude(amount=-F5_DEPTH)

    # F6 (on face) → F7 (cut, through all)
    with BuildSketch(Plane.YZ.offset(10.16)):
        with Locations((-0.635, -34.638124398)):
            Circle(F6_R)
        with BuildLine():
            Line((-0.8615136853, -35.5021369771), (-0.3175, -35.1880505294))
            ThreePointArc((-0.3175, -35.1880505294), (-0.7967279245, -35.2471937657), (-1.1790136853, -34.9522108457))
            Line((-1.1790136853, -34.9522108457), (-0.8615136853, -35.5021369771))
        make_face()
    extrude(amount=-F7_DEPTH, mode=Mode.SUBTRACT)

    # F8 (radius 0.635 in the source; OpenCascade refuses exactly that, so slightly less here)
    f8_edges = [f1.edges().sort_by_distance(p)[0] for p in [
        (0, -1.496514, -34.402285),
    ]]
    fillet(f8_edges, radius=F8_R)

    # F10 (on offset) → F11 (cut)
    with BuildSketch(Plane.XZ.offset(1.27)):
        with Locations((-8.128, -33.9503228112)):
            Rectangle(F10_W, F10_H)
        with Locations((0.0045306296, -33.9797824069)):
            Rectangle(F10_W_2, F10_H_2)
        with Locations((8.1325306296, -34.2510040297)):
            Rectangle(F10_W_3, F10_H_3)
    extrude(amount=-F11_DEPTH, mode=Mode.SUBTRACT)

    # F12
    f12_edges = [f1.edges().sort_by_distance(p)[0] for p in [
        (0, 1.27, -34.271507),
    ]]
    fillet(f12_edges, radius=F12_R)


solid = f1.part
